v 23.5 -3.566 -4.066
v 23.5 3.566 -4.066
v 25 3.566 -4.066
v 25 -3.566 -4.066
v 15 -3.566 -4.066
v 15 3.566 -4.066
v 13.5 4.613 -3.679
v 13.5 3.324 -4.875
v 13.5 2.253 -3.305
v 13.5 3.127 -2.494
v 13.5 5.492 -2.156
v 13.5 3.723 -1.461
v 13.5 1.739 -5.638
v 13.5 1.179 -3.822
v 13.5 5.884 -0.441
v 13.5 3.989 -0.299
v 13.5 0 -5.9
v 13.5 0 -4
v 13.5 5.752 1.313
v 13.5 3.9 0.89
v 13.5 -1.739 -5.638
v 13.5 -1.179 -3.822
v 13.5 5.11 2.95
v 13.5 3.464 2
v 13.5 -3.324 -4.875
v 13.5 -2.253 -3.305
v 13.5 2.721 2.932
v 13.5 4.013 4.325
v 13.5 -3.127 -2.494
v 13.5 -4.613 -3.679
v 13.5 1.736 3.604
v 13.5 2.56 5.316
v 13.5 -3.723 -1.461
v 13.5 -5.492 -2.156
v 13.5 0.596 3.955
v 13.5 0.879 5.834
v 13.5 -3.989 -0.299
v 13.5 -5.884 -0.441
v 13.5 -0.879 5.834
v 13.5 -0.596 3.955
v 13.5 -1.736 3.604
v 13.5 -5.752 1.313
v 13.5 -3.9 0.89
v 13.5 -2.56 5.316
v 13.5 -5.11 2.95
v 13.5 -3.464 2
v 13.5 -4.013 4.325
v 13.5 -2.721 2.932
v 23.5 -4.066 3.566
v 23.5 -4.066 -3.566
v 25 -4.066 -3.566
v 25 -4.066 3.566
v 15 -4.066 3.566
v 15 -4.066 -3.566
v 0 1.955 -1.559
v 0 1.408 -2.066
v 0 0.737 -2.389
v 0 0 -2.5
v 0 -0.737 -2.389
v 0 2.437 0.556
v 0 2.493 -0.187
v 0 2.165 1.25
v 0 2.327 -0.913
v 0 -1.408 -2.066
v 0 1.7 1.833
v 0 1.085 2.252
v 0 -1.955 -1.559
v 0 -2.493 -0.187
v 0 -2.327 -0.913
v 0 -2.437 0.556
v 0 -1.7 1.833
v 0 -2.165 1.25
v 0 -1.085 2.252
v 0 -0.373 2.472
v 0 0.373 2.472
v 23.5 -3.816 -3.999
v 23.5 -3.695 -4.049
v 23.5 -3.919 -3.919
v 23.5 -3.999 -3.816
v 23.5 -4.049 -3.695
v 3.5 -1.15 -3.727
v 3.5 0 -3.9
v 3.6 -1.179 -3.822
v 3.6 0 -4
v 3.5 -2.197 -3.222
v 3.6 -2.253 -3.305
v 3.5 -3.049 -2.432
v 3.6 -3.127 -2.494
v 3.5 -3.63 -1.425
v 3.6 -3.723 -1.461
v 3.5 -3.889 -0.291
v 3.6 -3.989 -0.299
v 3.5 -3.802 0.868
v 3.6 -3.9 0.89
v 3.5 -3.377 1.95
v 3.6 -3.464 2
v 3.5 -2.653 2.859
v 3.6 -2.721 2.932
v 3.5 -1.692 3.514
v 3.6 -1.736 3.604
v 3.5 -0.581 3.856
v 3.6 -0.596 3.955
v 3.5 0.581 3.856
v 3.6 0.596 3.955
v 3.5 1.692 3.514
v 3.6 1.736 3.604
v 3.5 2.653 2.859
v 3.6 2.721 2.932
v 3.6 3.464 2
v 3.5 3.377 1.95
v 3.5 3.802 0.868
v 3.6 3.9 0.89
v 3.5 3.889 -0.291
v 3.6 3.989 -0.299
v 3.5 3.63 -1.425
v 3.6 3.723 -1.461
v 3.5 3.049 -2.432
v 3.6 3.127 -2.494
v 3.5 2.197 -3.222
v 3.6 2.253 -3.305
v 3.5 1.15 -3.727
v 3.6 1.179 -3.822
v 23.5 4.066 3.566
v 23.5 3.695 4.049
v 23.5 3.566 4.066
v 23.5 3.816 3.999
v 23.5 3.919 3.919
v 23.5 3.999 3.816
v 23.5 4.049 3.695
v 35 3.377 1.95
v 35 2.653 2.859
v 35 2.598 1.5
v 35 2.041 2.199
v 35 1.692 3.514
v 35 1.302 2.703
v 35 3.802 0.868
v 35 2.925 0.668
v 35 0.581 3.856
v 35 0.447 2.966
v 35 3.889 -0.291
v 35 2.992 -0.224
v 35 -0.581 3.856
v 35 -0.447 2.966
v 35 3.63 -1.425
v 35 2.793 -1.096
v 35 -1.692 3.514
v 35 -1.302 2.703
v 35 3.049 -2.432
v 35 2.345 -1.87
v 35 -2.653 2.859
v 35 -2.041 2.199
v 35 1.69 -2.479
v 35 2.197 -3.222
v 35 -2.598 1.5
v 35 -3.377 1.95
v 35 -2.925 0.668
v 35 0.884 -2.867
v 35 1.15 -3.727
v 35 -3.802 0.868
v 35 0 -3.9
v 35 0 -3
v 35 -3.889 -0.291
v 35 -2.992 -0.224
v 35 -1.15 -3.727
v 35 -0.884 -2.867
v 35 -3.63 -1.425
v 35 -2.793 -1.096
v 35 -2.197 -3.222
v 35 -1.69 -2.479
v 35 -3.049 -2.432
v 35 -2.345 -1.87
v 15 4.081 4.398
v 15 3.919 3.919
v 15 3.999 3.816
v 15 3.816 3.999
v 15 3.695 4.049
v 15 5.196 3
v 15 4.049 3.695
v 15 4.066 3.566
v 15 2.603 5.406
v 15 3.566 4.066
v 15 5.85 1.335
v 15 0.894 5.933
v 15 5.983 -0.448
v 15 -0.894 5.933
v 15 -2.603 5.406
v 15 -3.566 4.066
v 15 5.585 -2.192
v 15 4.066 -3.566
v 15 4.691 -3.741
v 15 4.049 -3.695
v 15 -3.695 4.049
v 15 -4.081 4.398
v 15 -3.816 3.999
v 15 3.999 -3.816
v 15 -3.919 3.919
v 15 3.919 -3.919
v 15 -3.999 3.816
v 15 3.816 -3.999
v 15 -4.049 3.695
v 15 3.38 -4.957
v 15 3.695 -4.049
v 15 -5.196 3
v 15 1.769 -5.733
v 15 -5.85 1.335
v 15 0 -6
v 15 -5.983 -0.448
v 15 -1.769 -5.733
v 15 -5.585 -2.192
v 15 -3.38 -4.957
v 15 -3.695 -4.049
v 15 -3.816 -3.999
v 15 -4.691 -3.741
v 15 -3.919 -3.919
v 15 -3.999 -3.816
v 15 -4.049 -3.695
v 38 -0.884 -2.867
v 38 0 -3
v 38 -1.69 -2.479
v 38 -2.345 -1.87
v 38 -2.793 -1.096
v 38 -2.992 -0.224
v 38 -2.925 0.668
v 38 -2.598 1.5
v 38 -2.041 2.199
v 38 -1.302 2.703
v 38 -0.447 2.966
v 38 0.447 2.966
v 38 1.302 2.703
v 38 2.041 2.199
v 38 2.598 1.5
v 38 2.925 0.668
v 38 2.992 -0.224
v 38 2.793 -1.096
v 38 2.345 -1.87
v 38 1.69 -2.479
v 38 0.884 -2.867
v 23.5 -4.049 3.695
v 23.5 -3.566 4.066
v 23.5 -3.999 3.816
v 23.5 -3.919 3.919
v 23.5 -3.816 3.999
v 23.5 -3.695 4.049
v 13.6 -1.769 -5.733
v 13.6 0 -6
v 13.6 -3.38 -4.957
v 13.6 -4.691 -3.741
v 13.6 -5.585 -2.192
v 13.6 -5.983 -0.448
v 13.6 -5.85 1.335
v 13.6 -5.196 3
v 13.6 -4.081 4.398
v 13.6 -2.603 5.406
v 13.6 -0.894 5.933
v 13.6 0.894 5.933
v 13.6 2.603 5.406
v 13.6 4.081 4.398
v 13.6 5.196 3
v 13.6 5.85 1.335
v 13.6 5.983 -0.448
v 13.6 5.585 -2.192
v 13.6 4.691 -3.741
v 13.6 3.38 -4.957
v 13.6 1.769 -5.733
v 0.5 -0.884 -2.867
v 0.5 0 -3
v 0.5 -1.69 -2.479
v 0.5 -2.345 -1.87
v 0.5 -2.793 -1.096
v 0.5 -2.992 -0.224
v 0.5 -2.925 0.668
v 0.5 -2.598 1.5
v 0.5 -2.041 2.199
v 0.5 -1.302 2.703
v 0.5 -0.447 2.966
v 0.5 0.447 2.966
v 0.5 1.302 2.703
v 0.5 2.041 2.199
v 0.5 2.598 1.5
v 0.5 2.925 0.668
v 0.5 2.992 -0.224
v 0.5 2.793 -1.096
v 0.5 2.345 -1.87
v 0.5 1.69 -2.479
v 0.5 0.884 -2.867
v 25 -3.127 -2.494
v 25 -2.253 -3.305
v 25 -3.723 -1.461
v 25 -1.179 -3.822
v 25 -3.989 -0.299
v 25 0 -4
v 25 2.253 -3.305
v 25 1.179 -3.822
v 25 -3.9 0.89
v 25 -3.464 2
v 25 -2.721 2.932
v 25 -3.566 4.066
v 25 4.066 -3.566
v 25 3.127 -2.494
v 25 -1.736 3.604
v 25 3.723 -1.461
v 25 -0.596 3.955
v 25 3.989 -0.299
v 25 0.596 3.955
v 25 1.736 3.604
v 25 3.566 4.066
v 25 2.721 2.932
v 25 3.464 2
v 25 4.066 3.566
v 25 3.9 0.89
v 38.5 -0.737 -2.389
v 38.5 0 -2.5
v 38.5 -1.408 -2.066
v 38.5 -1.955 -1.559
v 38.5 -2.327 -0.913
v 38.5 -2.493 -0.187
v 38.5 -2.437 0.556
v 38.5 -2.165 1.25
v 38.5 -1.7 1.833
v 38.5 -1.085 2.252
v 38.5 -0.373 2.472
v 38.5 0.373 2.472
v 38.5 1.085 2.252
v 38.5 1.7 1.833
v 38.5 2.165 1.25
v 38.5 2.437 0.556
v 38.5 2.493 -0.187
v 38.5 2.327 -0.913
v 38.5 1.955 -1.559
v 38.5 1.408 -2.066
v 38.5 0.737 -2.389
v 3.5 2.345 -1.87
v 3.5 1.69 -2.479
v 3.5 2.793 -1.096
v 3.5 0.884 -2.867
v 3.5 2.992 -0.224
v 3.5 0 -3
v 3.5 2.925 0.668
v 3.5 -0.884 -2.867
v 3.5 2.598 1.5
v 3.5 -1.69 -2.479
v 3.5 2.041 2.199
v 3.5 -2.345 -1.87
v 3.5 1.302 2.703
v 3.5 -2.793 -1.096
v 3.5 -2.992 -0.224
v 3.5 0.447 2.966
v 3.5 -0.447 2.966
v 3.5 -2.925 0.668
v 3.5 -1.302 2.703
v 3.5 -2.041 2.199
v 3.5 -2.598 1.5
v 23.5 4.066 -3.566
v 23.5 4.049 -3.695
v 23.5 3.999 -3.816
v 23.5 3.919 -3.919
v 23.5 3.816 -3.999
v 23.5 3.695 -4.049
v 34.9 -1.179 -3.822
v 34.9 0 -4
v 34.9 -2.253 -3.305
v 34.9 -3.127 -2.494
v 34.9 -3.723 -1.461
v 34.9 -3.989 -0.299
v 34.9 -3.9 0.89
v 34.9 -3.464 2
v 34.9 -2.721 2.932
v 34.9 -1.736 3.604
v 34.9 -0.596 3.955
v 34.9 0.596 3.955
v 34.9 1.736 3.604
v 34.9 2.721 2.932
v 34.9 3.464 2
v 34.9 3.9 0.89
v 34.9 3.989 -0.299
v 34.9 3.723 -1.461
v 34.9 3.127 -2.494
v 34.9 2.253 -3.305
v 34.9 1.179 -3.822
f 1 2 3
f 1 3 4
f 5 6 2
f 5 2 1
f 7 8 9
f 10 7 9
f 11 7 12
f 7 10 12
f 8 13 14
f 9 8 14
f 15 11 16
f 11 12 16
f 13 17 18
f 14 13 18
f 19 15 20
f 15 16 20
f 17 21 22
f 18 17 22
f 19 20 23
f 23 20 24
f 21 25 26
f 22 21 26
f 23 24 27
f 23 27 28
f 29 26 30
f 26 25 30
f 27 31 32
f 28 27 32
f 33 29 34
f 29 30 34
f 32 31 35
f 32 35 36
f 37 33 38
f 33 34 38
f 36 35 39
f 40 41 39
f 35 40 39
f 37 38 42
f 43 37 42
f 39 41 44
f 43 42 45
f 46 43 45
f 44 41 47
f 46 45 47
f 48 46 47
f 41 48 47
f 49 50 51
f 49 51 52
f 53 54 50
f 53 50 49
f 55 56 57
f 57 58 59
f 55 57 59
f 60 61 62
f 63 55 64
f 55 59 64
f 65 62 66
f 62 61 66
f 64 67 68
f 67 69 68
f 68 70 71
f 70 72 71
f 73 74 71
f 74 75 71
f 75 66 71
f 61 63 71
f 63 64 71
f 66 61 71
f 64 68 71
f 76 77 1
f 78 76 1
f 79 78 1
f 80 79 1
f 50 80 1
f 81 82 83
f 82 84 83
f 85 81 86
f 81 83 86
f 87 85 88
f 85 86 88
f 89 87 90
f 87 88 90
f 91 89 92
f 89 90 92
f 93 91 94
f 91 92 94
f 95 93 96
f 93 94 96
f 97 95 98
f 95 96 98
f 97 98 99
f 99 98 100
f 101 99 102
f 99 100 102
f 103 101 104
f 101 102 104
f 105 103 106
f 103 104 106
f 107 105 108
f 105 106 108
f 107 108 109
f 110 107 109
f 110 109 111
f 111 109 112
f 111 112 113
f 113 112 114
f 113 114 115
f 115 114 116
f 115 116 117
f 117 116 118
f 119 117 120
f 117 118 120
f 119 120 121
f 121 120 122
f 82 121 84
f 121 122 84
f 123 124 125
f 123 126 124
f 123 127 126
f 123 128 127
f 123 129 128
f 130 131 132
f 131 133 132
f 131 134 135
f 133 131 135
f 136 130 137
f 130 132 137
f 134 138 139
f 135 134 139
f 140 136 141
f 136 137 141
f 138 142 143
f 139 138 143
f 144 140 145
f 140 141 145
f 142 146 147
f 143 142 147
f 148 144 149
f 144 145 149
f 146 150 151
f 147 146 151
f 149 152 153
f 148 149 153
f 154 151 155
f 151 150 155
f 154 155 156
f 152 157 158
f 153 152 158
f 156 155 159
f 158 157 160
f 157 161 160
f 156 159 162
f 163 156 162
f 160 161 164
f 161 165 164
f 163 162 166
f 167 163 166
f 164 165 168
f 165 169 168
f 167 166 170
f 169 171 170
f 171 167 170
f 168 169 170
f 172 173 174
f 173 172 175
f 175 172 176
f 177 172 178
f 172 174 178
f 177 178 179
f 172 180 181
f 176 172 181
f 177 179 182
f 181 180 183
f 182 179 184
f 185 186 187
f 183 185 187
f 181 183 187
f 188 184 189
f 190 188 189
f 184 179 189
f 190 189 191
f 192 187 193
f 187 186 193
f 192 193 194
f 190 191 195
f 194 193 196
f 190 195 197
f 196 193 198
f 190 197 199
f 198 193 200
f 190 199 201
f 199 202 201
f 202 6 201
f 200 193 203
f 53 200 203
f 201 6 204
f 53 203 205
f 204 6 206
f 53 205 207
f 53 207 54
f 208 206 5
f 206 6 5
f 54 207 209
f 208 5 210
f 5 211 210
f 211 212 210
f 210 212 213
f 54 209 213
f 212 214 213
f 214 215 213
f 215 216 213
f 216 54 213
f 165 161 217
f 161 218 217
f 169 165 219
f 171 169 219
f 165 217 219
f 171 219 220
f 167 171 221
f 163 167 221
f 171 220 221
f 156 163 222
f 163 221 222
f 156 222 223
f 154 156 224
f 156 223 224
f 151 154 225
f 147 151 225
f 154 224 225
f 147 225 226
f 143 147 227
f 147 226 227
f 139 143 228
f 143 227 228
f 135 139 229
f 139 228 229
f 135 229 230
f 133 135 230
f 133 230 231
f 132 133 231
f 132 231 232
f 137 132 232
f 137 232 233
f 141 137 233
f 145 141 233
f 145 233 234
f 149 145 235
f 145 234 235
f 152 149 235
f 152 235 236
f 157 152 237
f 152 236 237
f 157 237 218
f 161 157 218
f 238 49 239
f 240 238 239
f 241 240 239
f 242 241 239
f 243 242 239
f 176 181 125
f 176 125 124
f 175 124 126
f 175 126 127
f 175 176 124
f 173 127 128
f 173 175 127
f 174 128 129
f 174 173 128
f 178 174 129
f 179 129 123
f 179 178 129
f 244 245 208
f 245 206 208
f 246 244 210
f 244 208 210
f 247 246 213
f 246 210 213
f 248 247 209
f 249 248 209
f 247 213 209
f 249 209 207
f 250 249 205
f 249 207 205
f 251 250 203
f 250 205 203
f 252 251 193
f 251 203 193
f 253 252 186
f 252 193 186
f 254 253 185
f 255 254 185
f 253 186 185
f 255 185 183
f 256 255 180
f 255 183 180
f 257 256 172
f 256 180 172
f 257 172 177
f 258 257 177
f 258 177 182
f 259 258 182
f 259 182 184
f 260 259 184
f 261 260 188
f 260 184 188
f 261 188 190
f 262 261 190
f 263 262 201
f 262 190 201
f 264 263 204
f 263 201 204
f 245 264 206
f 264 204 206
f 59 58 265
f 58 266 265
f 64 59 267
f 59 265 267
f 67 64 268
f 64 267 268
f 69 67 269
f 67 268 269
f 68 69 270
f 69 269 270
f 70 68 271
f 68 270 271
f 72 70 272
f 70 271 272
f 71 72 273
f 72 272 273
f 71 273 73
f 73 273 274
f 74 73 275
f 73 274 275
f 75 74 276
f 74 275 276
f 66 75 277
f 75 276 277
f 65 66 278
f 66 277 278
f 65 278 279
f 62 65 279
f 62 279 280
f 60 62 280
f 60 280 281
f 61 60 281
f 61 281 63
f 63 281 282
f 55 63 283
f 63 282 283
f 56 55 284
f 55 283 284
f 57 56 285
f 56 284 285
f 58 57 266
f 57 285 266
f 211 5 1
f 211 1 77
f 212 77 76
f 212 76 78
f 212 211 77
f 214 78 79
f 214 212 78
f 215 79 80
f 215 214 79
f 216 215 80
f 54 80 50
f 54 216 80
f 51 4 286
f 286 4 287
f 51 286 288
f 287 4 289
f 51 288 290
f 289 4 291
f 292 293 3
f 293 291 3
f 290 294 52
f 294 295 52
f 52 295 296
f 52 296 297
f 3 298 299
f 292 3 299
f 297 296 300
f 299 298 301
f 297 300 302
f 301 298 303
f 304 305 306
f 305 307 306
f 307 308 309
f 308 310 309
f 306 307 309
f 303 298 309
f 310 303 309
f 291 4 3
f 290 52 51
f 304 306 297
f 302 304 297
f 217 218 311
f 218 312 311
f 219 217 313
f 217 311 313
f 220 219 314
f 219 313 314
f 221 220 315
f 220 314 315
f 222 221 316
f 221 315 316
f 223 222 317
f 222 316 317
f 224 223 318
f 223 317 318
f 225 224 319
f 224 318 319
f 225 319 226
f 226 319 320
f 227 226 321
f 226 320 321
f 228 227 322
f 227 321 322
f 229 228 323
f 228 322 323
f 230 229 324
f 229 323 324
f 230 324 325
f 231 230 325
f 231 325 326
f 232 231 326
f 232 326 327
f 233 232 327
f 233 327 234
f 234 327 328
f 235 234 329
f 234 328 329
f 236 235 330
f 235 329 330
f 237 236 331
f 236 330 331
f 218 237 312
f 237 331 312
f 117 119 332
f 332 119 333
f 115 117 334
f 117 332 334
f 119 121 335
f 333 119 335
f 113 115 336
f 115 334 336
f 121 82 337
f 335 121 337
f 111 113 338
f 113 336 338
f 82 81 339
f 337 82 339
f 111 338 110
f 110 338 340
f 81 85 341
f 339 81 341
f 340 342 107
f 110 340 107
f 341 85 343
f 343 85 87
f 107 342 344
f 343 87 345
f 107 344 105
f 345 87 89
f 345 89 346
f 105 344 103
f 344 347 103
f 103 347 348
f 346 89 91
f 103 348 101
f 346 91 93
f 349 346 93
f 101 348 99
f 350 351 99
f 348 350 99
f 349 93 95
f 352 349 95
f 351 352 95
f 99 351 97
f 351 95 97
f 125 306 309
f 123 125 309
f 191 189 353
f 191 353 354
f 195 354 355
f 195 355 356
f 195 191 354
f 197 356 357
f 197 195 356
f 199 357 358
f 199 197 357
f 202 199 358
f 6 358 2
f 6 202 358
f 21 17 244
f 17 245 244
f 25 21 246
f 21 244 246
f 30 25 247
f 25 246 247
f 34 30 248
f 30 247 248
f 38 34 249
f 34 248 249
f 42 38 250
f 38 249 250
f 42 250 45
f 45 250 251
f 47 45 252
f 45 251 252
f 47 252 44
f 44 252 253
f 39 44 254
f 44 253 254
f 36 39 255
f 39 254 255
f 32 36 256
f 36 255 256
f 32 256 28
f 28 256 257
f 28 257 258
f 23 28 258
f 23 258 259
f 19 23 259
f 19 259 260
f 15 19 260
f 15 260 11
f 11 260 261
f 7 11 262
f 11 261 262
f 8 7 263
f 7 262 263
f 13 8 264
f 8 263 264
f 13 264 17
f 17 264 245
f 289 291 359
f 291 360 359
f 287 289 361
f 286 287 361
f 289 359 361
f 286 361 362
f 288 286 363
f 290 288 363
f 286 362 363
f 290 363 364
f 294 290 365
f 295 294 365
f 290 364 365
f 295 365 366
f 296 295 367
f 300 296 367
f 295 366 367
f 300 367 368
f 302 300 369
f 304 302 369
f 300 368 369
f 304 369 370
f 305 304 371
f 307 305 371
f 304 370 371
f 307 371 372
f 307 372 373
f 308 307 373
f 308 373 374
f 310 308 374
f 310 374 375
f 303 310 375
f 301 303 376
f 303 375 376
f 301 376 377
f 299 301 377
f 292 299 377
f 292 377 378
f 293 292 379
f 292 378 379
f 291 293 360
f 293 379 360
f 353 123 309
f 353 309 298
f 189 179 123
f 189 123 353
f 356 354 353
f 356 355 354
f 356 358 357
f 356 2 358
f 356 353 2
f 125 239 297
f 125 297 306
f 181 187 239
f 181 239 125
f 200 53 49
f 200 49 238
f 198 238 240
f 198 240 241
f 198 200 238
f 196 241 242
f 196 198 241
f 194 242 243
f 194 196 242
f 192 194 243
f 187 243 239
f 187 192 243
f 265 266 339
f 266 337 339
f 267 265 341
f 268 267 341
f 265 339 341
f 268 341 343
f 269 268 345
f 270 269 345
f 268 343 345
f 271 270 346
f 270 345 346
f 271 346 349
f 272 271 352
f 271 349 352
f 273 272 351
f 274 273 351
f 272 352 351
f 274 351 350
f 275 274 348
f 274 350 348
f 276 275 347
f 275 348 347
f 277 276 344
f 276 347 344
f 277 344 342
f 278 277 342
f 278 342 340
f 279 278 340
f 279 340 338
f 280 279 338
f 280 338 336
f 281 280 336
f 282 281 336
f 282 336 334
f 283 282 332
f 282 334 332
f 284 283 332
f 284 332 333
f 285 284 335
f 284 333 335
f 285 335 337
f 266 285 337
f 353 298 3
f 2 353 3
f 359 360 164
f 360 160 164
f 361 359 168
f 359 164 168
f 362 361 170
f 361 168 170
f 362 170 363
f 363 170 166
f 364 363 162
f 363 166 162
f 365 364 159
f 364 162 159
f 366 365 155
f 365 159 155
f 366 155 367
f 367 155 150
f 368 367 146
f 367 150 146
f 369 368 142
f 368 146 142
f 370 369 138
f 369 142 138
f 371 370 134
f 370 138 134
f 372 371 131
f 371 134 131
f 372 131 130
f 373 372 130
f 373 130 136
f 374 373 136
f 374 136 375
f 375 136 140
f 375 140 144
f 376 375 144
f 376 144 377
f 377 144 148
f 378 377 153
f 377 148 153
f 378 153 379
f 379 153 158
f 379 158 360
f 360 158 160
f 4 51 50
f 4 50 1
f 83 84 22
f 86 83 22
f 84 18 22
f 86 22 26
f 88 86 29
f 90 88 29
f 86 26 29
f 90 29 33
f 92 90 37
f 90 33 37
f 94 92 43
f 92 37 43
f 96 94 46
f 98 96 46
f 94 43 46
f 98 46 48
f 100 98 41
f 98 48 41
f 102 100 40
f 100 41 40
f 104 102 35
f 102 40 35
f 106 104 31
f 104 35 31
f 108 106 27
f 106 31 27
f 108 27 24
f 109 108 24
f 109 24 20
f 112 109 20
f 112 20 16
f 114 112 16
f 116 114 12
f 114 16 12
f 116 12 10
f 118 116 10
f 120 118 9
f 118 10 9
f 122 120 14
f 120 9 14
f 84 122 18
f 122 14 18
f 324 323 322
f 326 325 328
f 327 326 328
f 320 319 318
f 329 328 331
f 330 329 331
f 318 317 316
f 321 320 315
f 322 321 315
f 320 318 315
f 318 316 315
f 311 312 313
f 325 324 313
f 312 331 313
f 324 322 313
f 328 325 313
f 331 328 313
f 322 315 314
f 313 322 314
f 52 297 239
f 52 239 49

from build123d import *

# Parameters (mm, degrees)
EXTRUDE_1_DEPTH     = 10
CUT_EXTRUDE_2_DEPTH = 1.5


with BuildPart() as part:
    # 草图1 → 旋转1 (revolve)
    with BuildSketch(Plane.XY, mode=Mode.PRIVATE) as revolve_1_sk:
        Polygon((0, 0), (0, 2.5), (0.5, 3), (3.5, 3), (3.5, 3.9), (3.6, 4), (13.5, 4), (13.5, 5.9), (13.6, 6), (15, 6), (15, 0), align=None)
    revolve(revolve_1_sk.sketch.rotate(Axis((15, 0, 0), (-1, 0, 0)), 90), axis=Axis((15, 0, 0), (-1, 0, 0)))

    # 草图2 → 凸台-拉伸1 (add)
    with BuildSketch(Plane(origin=(15, 0, 0), x_dir=(0, 0, -1), z_dir=(1, 0, 0))):
        with BuildLine():
            Line((-3.565863992, 4.065863992), (3.565863992, 4.065863992))
            ThreePointArc((3.565863992, 4.065863992), (3.919417382, 3.919417382), (4.065863992, 3.565863992))
            Line((4.065863992, 3.565863992), (4.065863992, -3.565863992))
            ThreePointArc((4.065863992, -3.565863992), (3.919417382, -3.919417382), (3.565863992, -4.065863992))
            Line((3.565863992, -4.065863992), (-3.565863992, -4.065863992))
            ThreePointArc((-3.565863992, -4.065863992), (-3.919417382, -3.919417382), (-4.065863992, -3.565863992))
            Line((-4.065863992, -3.565863992), (-4.065863992, 3.565863992))
            ThreePointArc((-4.065863992, 3.565863992), (-3.919417382, 3.919417382), (-3.565863992, 4.065863992))
        make_face()
    extrude(amount=EXTRUDE_1_DEPTH)

    # 草图3 → 切除-拉伸2 (cut)
    with BuildSketch(Plane(origin=(25, 0, 0), x_dir=(0, 0, -1), z_dir=(1, 0, 0))):
        Polygon((-4.065863992, 3.565863992), (-3.565863992, 4.065863992), (-4.065863992, 4.065863992), align=None)
        Polygon((3.565863992, 4.065863992), (4.065863992, 3.565863992), (4.065863992, 4.065863992), align=None)
        Polygon((-4.065863992, -3.565863992), (-3.565863992, -4.065863992), (-4.065863992, -4.065863992), align=None)
        Polygon((3.565863992, -4.065863992), (4.065863992, -3.565863992), (4.065863992, -4.065863992), align=None)
    extrude(amount=-CUT_EXTRUDE_2_DEPTH, mode=Mode.SUBTRACT)

    # 草图5 → 旋转2 (revolve)
    with BuildSketch(Plane.XY, mode=Mode.PRIVATE) as revolve_2_sk:
        Polygon((35, 3.9), (35, 3), (38, 3), (38.5, 2.5), (38.5, 0), (25, 0), (25, 4), (34.9, 4), align=None)
    revolve(revolve_2_sk.sketch.rotate(Axis((38.5, 0, 0), (-1, 0, 0)), 90), axis=Axis((38.5, 0, 0), (-1, 0, 0)))


solid = part.part
